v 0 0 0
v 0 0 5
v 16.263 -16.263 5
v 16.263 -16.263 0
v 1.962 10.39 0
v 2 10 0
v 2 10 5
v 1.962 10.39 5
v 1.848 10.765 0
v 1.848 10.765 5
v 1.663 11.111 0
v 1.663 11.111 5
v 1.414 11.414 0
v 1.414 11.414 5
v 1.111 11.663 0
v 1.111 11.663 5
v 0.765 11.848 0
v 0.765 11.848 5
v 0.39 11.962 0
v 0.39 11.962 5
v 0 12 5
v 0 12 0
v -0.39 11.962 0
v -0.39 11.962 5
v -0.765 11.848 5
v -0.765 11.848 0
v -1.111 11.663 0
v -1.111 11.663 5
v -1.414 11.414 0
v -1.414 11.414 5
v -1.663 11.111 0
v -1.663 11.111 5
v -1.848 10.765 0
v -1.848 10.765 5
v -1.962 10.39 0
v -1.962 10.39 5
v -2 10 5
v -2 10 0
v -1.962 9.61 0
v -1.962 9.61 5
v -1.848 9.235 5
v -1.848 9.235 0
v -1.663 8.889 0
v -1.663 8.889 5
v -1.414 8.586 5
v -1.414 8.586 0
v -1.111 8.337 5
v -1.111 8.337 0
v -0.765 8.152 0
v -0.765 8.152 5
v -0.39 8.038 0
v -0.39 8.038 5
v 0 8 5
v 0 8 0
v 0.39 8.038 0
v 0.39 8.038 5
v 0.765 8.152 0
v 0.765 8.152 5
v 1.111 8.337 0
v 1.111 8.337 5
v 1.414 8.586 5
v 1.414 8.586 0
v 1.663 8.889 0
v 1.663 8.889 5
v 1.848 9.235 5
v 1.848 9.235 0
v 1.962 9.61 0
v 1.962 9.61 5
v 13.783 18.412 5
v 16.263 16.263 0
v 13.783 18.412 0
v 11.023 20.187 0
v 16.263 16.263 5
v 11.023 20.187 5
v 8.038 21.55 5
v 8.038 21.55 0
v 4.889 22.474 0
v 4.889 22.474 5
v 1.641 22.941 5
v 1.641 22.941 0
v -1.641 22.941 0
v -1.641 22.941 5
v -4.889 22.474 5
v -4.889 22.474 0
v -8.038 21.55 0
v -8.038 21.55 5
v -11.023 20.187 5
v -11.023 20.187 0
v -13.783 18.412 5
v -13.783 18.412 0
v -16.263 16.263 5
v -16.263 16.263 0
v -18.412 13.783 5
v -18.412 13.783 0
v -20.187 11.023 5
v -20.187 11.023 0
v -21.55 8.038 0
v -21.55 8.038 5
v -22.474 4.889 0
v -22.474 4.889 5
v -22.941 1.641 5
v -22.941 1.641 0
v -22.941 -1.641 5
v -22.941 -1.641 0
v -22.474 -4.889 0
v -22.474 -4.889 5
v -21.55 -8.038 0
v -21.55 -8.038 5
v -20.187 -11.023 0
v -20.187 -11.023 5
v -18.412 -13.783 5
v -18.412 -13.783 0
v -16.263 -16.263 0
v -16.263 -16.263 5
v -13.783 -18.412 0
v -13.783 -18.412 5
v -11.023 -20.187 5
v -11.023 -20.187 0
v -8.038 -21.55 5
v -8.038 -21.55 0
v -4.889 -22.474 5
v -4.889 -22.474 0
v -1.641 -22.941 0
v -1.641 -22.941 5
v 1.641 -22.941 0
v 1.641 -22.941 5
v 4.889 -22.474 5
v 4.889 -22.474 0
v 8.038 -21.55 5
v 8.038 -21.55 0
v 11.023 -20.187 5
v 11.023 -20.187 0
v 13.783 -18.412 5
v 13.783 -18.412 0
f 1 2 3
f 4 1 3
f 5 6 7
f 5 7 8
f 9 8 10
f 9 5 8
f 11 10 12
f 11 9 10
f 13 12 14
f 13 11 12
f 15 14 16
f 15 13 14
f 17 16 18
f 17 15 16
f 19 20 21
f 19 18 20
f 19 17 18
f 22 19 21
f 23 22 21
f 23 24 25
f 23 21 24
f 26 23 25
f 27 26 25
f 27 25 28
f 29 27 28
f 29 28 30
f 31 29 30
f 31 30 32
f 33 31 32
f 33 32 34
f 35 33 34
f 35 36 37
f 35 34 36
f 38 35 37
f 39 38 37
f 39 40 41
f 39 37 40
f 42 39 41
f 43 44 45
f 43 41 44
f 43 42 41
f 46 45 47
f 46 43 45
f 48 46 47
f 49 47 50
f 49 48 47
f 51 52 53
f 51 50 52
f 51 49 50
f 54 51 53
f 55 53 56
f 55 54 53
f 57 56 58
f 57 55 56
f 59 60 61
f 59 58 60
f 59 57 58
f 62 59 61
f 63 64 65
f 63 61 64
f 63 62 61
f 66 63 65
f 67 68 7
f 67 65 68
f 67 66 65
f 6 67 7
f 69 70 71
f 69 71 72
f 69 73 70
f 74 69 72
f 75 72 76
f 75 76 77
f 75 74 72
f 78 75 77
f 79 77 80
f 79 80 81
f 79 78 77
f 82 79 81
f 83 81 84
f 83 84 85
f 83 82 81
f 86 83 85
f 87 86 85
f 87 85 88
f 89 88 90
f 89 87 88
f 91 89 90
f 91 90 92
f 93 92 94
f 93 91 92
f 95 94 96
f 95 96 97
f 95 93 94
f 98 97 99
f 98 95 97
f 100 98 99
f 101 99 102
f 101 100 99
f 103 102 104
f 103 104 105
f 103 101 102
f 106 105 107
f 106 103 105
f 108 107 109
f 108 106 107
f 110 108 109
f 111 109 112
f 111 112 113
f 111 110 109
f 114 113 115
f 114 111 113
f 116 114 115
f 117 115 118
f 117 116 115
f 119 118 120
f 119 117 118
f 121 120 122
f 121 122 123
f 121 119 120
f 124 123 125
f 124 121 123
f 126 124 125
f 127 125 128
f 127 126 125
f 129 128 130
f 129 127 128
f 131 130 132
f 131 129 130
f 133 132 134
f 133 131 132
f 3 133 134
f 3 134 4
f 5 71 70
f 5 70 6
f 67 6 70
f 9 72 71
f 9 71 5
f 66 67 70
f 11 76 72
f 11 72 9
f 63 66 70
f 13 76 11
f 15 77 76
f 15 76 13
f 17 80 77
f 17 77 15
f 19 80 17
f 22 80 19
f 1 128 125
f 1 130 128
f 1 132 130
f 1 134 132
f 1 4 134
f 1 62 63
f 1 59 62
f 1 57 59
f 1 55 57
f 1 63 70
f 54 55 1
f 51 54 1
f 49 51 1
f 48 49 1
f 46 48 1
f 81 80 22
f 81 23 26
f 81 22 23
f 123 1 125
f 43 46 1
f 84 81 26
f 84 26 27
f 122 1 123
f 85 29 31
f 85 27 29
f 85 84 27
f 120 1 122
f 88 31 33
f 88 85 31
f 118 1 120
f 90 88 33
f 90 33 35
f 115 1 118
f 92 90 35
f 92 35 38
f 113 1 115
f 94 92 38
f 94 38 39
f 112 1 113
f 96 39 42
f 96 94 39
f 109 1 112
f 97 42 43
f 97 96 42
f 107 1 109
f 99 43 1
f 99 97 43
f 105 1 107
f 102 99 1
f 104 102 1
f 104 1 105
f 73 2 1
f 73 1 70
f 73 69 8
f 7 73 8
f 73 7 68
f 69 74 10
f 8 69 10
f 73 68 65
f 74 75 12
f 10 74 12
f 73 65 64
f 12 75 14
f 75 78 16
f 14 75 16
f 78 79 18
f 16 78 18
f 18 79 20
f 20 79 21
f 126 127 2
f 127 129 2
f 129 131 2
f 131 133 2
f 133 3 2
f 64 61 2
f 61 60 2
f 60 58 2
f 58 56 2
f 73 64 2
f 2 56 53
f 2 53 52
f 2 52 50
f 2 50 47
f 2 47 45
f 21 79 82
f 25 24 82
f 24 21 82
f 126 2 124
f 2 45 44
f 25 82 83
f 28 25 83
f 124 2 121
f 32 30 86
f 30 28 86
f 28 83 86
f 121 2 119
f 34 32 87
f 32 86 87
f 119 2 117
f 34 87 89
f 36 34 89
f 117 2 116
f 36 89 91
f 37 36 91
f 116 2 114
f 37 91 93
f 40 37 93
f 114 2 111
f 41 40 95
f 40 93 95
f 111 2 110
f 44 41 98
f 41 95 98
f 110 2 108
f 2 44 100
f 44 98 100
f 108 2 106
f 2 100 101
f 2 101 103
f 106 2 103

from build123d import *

# Parameters (mm, degrees)
CYLINDER001_R            = 2
CYLINDER001_DEPTH        = 10
CYLINDER_W               = 23
CYLINDER_H               = 5
CYLINDER_ANGLE           = 270
CYLINDER_PLACEMENT_ANGLE = 45


with BuildPart() as ojo:
    # Cylinder001 → Cylinder001 (new body)
    with BuildSketch(Plane(origin=(0, 10, -3), x_dir=(1, 0, 0), z_dir=(0, 0, 1))):
        Circle(CYLINDER001_R)
    extrude(amount=CYLINDER001_DEPTH)


with BuildPart() as pacman001:
    # Cylinder → Cylinder (revolve)
    with BuildSketch(Plane.XZ):
        with Locations((11.5, 2.5)):
            Rectangle(CYLINDER_W, CYLINDER_H)
    revolve(axis=Axis((0, 0, 0), (0, 0, 1)), revolution_arc=CYLINDER_ANGLE)


with BuildPart() as pacman001_1:
    # Cylinder placement: moved
    add(pacman001.part.rotate(Axis((0, 0, 0), (0, 0, 1)), CYLINDER_PLACEMENT_ANGLE))

    # Cut: cut Ojo
    add(ojo.part, mode=Mode.SUBTRACT)


solid = pacman001_1.part
